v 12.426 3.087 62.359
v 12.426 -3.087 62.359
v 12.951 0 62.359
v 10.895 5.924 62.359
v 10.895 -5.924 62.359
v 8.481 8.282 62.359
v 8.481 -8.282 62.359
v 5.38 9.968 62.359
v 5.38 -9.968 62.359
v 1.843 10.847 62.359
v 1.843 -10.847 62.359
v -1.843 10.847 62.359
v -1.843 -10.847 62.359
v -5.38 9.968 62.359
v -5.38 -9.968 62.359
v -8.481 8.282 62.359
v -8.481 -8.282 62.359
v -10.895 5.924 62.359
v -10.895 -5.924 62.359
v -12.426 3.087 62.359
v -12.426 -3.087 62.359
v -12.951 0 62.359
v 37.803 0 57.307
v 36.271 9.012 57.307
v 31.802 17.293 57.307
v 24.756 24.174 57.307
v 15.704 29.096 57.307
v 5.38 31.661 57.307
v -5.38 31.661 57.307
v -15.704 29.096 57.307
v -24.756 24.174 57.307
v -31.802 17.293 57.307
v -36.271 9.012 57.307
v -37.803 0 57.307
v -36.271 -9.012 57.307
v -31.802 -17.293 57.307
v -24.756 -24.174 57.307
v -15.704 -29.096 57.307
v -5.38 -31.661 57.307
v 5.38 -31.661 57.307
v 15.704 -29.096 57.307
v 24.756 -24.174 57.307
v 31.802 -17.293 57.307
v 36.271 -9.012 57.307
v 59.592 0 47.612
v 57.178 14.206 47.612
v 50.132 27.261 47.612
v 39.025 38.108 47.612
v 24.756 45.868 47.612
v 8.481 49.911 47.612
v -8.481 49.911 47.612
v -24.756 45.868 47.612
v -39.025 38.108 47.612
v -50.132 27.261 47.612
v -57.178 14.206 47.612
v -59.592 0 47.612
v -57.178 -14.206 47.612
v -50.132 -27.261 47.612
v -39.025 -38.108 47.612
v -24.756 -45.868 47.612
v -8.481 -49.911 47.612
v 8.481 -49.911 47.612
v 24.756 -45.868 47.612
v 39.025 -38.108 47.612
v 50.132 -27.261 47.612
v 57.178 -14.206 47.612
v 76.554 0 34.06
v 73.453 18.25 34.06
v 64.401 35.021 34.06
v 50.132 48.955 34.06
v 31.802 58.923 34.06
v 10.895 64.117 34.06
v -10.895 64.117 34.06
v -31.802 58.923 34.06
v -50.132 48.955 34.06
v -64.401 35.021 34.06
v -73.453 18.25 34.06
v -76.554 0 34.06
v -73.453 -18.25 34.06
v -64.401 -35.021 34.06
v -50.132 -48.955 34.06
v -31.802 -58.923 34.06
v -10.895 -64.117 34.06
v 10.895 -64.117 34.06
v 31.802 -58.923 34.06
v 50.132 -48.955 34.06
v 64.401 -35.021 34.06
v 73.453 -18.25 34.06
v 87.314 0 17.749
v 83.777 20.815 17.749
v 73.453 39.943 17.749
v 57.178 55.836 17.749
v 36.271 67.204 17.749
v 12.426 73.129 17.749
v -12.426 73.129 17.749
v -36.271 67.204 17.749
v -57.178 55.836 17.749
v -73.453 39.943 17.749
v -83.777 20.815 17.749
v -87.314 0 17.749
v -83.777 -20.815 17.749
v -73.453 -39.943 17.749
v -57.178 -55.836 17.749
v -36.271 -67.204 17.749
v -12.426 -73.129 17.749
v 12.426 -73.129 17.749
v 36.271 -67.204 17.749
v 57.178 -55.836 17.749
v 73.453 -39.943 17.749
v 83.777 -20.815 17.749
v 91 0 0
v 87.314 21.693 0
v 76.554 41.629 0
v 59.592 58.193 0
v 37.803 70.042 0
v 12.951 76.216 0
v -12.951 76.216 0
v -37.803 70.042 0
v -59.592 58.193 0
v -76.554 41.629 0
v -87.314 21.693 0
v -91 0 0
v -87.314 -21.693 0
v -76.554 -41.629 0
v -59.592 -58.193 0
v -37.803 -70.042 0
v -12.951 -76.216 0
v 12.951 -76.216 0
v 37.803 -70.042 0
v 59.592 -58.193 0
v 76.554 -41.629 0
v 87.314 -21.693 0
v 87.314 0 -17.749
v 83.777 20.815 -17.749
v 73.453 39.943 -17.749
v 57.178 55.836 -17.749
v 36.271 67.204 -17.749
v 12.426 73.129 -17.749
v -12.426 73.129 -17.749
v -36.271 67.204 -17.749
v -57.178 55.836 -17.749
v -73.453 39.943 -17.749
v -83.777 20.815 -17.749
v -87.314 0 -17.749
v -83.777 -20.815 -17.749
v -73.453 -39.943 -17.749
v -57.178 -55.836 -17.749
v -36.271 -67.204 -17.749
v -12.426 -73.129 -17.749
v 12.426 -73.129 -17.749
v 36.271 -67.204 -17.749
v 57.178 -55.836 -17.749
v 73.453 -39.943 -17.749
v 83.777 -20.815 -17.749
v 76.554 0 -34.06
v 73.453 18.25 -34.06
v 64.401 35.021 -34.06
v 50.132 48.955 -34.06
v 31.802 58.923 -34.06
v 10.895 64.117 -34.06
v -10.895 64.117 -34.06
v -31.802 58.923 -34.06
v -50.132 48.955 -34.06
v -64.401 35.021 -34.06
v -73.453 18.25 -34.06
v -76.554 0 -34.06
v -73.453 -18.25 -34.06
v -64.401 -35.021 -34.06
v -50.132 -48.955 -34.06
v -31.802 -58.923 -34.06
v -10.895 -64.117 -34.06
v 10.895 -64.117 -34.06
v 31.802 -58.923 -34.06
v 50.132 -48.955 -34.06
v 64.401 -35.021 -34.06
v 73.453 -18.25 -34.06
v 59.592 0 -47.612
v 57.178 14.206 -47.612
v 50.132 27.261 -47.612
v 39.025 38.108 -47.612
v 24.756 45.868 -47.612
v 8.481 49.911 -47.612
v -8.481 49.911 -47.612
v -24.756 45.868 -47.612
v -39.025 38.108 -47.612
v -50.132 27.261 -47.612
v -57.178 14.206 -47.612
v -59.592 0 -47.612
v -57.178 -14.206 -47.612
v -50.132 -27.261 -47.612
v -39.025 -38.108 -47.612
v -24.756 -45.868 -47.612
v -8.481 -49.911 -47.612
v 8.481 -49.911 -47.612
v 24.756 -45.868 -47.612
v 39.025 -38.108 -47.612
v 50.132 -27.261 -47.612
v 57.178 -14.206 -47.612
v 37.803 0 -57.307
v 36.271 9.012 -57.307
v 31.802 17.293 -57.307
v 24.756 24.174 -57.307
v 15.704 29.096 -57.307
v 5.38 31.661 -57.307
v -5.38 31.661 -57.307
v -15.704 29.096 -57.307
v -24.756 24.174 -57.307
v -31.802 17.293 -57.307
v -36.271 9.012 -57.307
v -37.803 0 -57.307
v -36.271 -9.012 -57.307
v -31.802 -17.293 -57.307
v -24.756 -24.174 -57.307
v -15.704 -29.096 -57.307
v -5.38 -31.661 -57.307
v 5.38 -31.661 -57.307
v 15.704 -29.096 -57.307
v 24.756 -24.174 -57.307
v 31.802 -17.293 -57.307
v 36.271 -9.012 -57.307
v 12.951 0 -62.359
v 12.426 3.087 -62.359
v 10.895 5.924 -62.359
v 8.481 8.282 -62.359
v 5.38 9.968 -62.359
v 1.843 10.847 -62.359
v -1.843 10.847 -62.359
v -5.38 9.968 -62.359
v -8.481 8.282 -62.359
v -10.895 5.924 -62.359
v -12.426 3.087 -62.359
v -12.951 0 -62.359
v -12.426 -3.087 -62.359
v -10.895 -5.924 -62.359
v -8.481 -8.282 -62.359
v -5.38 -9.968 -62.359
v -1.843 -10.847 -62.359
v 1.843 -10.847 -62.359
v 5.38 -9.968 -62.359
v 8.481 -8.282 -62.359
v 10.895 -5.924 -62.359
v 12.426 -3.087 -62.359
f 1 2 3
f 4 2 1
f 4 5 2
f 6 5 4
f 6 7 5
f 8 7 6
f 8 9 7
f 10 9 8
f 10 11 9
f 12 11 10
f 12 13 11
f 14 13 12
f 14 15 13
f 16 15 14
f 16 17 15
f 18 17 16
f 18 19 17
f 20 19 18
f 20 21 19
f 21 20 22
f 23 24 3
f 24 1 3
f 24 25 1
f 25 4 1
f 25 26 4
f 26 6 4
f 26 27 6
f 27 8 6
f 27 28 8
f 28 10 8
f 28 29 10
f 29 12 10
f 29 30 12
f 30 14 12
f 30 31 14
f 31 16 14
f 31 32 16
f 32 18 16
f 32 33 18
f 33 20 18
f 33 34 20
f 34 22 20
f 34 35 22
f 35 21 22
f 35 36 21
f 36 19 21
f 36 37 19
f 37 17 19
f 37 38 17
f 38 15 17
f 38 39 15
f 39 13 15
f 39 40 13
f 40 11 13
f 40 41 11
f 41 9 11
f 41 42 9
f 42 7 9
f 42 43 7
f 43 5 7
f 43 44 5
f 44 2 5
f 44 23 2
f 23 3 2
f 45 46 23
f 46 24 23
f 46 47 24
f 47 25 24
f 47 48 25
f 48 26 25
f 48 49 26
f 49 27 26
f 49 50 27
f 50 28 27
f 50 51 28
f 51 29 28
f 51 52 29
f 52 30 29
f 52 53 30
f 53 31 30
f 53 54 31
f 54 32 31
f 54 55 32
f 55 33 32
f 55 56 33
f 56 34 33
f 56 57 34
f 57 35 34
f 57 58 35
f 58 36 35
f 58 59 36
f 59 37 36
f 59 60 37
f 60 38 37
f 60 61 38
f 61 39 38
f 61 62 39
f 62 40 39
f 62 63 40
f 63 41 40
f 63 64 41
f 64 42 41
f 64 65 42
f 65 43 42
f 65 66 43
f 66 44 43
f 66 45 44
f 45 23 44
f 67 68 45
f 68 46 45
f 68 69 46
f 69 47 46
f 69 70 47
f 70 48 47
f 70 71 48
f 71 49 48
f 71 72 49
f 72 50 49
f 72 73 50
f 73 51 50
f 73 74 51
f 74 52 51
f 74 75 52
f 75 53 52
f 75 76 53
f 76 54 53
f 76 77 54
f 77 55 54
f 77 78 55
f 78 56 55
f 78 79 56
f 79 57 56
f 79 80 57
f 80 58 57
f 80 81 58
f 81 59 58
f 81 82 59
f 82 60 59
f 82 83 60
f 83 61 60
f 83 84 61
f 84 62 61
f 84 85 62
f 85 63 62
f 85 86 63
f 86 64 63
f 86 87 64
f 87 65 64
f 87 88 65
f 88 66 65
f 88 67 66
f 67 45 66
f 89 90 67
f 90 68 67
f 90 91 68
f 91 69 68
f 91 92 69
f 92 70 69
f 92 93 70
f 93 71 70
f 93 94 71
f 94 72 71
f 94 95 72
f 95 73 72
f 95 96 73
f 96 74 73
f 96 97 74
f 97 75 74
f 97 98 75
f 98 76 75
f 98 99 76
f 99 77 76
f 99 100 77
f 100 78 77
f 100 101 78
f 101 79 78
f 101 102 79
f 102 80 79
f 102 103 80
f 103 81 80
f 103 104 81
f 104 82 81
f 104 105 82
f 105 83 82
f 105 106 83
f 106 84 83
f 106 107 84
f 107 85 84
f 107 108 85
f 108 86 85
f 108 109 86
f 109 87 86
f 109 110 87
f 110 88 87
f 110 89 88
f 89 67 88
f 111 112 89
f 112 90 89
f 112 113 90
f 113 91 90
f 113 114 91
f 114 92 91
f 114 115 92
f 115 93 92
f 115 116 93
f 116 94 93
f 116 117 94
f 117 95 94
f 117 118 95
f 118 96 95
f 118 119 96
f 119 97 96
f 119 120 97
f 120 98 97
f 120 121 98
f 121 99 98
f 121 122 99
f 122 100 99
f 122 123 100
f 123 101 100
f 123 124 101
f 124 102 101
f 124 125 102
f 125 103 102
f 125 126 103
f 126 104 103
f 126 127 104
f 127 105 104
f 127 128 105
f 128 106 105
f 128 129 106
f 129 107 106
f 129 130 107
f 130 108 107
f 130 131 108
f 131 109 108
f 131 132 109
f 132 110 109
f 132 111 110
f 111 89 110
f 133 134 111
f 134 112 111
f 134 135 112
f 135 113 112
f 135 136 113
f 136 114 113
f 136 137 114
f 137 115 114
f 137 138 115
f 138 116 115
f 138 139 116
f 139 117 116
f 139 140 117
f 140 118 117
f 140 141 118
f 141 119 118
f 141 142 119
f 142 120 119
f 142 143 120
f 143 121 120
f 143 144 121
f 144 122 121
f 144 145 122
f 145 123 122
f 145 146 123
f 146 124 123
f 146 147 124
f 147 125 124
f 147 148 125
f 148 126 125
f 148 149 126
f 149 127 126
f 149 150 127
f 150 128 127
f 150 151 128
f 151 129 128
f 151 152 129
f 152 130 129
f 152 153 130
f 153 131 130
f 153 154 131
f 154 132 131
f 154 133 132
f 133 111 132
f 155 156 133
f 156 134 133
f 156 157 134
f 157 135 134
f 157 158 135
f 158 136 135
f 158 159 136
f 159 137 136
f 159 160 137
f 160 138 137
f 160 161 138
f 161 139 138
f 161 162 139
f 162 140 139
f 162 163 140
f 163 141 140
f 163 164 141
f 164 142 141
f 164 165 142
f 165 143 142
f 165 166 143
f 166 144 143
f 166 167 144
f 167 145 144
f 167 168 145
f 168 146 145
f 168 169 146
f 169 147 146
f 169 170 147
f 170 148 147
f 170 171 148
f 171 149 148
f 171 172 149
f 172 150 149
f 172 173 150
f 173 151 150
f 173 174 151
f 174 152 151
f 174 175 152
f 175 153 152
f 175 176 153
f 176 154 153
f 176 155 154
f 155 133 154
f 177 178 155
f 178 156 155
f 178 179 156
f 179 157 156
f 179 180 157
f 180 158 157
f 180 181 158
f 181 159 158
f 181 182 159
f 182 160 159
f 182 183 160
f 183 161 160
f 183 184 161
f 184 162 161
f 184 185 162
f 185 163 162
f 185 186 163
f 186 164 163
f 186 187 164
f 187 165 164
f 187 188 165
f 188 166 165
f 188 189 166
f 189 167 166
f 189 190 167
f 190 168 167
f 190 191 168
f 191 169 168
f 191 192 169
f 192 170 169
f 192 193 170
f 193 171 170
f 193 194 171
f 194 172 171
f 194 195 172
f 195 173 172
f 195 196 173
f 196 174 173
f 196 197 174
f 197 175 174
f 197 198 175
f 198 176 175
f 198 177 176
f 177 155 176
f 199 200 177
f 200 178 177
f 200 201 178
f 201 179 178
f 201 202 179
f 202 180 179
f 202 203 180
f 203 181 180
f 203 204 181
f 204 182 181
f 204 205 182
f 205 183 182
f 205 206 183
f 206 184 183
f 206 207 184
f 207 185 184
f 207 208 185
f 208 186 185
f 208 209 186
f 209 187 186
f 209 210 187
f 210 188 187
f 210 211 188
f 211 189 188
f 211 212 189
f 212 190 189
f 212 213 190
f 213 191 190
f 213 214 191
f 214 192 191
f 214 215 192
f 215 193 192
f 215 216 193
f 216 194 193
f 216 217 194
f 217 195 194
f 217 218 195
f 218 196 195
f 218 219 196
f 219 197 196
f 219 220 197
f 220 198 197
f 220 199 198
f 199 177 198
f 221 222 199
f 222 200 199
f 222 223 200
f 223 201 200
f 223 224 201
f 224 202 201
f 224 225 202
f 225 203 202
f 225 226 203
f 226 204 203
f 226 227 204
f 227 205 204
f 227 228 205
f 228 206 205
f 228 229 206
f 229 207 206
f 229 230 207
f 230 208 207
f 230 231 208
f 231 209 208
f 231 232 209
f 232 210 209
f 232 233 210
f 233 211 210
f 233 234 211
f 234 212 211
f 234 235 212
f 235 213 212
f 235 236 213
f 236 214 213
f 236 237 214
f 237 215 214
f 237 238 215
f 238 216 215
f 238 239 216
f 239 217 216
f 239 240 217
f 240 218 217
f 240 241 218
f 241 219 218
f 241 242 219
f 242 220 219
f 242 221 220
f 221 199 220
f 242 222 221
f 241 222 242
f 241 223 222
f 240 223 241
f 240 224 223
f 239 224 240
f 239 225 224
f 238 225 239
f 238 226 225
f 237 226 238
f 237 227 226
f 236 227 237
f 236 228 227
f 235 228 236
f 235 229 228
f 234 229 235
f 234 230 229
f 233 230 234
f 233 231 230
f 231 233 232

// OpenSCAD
// Generated by SolidPython 1.0.1 on 2020-07-29 00:46:50


scale(v = [13, 11, 9]) {
	sphere(r = 7);
}
/***********************************************
*********      SolidPython code:      **********
************************************************
 
# import packages: SolidPython
from solid import *
from solid.utils import *
from itertools import chain, combinations, permutations


class Resize:

    def __init__(self, scad_file):
        self.scad_file = scad_file
        #self.scad_file = import_scad(scad_file)
        # cone/cylinder param:
        self.r1 = 0
        self.r2 = 0
        self.h = 0
        # rectangular prism param:
        self.w = 0
        self.l = 0
        # ellipse param:
        self.r = 0

    # import OpenScad code (file name corresponds to shape)


    # classify shape + parameters
    def assign(self, param1, param2, param3):
        if self.scad_file == 'cone.scad':
            self.r1 = param1
            self.r2 = param2
            self.h = param3
        elif self.scad_file == 'cylinder.scad':
            self.r1 = param1
            self.r2 = param2
            self.h = param3
        elif self.scad_file == 'rectangularPrism.scad':
            self.h = param1
            self.l = param2
            self.w = param3
        else:
            self.r = param1
            self.h = param2

    # resize parameters
    def iterate(self):
        x = range(3, 20, 2)
        i = 1
        if self.scad_file == 'cone.scad':
            tempList = list(permutations(x, 2))
            for temp in tempList:
                param1 = temp[0]
                param2 = temp[1]
                filepath = 'produced_scad_files/' + 'cone' + str(param1) + '_' + str(param2) + '_' + '.scad'
                scad_render_to_file(cylinder(h=param1, r1=param2, r2=0), filepath)

        elif self.scad_file == 'cylinder.scad':
            tempList = list(permutations(x, 3))
            for temp in tempList:
                param1 = temp[0]
                param2 = temp[1]
                filepath = 'produced_scad_files/' + 'cylinder' + str(param1) + '_' + str(param2) + '_' + '.scad'
                scad_render_to_file(cylinder(h=param1, r1=param2, r2=param2), filepath)

        elif self.scad_file == 'rectangularPrism.scad':
            tempList = list(permutations(x, 3))
            for temp in tempList:
                param1 = temp[0]
                param2 = temp[1]
                param3 = temp[2]
                filepath = 'produced_scad_files/' + 'rectangularPrism' + str(param1) + '_' + str(param2) + '_' + str(
                    param3) + '.scad'
                scad_render_to_file(cube(size=(param1, param2, param3)), filepath)

        elif self.scad_file == 'ellipse.scad':
            tempList = list(permutations(x, 4))
            for temp in tempList:
                param1 = temp[0]
                param2 = temp[1]
                param3 = temp[2]
                param4 = temp[3]
                filepath = 'produced_scad_files/' + 'ellipse' + str(param1) + '_' + str(param2) + '_' + str(param3) + '_' + str(param4) + '.scad'
                scad_render_to_file(scale([param1, param2, param3])(sphere(r=param4)), filepath)

    def render_to_scadfile(self):
        scad_render_to_file(scad, 'example.scad') 
 
************************************************/
